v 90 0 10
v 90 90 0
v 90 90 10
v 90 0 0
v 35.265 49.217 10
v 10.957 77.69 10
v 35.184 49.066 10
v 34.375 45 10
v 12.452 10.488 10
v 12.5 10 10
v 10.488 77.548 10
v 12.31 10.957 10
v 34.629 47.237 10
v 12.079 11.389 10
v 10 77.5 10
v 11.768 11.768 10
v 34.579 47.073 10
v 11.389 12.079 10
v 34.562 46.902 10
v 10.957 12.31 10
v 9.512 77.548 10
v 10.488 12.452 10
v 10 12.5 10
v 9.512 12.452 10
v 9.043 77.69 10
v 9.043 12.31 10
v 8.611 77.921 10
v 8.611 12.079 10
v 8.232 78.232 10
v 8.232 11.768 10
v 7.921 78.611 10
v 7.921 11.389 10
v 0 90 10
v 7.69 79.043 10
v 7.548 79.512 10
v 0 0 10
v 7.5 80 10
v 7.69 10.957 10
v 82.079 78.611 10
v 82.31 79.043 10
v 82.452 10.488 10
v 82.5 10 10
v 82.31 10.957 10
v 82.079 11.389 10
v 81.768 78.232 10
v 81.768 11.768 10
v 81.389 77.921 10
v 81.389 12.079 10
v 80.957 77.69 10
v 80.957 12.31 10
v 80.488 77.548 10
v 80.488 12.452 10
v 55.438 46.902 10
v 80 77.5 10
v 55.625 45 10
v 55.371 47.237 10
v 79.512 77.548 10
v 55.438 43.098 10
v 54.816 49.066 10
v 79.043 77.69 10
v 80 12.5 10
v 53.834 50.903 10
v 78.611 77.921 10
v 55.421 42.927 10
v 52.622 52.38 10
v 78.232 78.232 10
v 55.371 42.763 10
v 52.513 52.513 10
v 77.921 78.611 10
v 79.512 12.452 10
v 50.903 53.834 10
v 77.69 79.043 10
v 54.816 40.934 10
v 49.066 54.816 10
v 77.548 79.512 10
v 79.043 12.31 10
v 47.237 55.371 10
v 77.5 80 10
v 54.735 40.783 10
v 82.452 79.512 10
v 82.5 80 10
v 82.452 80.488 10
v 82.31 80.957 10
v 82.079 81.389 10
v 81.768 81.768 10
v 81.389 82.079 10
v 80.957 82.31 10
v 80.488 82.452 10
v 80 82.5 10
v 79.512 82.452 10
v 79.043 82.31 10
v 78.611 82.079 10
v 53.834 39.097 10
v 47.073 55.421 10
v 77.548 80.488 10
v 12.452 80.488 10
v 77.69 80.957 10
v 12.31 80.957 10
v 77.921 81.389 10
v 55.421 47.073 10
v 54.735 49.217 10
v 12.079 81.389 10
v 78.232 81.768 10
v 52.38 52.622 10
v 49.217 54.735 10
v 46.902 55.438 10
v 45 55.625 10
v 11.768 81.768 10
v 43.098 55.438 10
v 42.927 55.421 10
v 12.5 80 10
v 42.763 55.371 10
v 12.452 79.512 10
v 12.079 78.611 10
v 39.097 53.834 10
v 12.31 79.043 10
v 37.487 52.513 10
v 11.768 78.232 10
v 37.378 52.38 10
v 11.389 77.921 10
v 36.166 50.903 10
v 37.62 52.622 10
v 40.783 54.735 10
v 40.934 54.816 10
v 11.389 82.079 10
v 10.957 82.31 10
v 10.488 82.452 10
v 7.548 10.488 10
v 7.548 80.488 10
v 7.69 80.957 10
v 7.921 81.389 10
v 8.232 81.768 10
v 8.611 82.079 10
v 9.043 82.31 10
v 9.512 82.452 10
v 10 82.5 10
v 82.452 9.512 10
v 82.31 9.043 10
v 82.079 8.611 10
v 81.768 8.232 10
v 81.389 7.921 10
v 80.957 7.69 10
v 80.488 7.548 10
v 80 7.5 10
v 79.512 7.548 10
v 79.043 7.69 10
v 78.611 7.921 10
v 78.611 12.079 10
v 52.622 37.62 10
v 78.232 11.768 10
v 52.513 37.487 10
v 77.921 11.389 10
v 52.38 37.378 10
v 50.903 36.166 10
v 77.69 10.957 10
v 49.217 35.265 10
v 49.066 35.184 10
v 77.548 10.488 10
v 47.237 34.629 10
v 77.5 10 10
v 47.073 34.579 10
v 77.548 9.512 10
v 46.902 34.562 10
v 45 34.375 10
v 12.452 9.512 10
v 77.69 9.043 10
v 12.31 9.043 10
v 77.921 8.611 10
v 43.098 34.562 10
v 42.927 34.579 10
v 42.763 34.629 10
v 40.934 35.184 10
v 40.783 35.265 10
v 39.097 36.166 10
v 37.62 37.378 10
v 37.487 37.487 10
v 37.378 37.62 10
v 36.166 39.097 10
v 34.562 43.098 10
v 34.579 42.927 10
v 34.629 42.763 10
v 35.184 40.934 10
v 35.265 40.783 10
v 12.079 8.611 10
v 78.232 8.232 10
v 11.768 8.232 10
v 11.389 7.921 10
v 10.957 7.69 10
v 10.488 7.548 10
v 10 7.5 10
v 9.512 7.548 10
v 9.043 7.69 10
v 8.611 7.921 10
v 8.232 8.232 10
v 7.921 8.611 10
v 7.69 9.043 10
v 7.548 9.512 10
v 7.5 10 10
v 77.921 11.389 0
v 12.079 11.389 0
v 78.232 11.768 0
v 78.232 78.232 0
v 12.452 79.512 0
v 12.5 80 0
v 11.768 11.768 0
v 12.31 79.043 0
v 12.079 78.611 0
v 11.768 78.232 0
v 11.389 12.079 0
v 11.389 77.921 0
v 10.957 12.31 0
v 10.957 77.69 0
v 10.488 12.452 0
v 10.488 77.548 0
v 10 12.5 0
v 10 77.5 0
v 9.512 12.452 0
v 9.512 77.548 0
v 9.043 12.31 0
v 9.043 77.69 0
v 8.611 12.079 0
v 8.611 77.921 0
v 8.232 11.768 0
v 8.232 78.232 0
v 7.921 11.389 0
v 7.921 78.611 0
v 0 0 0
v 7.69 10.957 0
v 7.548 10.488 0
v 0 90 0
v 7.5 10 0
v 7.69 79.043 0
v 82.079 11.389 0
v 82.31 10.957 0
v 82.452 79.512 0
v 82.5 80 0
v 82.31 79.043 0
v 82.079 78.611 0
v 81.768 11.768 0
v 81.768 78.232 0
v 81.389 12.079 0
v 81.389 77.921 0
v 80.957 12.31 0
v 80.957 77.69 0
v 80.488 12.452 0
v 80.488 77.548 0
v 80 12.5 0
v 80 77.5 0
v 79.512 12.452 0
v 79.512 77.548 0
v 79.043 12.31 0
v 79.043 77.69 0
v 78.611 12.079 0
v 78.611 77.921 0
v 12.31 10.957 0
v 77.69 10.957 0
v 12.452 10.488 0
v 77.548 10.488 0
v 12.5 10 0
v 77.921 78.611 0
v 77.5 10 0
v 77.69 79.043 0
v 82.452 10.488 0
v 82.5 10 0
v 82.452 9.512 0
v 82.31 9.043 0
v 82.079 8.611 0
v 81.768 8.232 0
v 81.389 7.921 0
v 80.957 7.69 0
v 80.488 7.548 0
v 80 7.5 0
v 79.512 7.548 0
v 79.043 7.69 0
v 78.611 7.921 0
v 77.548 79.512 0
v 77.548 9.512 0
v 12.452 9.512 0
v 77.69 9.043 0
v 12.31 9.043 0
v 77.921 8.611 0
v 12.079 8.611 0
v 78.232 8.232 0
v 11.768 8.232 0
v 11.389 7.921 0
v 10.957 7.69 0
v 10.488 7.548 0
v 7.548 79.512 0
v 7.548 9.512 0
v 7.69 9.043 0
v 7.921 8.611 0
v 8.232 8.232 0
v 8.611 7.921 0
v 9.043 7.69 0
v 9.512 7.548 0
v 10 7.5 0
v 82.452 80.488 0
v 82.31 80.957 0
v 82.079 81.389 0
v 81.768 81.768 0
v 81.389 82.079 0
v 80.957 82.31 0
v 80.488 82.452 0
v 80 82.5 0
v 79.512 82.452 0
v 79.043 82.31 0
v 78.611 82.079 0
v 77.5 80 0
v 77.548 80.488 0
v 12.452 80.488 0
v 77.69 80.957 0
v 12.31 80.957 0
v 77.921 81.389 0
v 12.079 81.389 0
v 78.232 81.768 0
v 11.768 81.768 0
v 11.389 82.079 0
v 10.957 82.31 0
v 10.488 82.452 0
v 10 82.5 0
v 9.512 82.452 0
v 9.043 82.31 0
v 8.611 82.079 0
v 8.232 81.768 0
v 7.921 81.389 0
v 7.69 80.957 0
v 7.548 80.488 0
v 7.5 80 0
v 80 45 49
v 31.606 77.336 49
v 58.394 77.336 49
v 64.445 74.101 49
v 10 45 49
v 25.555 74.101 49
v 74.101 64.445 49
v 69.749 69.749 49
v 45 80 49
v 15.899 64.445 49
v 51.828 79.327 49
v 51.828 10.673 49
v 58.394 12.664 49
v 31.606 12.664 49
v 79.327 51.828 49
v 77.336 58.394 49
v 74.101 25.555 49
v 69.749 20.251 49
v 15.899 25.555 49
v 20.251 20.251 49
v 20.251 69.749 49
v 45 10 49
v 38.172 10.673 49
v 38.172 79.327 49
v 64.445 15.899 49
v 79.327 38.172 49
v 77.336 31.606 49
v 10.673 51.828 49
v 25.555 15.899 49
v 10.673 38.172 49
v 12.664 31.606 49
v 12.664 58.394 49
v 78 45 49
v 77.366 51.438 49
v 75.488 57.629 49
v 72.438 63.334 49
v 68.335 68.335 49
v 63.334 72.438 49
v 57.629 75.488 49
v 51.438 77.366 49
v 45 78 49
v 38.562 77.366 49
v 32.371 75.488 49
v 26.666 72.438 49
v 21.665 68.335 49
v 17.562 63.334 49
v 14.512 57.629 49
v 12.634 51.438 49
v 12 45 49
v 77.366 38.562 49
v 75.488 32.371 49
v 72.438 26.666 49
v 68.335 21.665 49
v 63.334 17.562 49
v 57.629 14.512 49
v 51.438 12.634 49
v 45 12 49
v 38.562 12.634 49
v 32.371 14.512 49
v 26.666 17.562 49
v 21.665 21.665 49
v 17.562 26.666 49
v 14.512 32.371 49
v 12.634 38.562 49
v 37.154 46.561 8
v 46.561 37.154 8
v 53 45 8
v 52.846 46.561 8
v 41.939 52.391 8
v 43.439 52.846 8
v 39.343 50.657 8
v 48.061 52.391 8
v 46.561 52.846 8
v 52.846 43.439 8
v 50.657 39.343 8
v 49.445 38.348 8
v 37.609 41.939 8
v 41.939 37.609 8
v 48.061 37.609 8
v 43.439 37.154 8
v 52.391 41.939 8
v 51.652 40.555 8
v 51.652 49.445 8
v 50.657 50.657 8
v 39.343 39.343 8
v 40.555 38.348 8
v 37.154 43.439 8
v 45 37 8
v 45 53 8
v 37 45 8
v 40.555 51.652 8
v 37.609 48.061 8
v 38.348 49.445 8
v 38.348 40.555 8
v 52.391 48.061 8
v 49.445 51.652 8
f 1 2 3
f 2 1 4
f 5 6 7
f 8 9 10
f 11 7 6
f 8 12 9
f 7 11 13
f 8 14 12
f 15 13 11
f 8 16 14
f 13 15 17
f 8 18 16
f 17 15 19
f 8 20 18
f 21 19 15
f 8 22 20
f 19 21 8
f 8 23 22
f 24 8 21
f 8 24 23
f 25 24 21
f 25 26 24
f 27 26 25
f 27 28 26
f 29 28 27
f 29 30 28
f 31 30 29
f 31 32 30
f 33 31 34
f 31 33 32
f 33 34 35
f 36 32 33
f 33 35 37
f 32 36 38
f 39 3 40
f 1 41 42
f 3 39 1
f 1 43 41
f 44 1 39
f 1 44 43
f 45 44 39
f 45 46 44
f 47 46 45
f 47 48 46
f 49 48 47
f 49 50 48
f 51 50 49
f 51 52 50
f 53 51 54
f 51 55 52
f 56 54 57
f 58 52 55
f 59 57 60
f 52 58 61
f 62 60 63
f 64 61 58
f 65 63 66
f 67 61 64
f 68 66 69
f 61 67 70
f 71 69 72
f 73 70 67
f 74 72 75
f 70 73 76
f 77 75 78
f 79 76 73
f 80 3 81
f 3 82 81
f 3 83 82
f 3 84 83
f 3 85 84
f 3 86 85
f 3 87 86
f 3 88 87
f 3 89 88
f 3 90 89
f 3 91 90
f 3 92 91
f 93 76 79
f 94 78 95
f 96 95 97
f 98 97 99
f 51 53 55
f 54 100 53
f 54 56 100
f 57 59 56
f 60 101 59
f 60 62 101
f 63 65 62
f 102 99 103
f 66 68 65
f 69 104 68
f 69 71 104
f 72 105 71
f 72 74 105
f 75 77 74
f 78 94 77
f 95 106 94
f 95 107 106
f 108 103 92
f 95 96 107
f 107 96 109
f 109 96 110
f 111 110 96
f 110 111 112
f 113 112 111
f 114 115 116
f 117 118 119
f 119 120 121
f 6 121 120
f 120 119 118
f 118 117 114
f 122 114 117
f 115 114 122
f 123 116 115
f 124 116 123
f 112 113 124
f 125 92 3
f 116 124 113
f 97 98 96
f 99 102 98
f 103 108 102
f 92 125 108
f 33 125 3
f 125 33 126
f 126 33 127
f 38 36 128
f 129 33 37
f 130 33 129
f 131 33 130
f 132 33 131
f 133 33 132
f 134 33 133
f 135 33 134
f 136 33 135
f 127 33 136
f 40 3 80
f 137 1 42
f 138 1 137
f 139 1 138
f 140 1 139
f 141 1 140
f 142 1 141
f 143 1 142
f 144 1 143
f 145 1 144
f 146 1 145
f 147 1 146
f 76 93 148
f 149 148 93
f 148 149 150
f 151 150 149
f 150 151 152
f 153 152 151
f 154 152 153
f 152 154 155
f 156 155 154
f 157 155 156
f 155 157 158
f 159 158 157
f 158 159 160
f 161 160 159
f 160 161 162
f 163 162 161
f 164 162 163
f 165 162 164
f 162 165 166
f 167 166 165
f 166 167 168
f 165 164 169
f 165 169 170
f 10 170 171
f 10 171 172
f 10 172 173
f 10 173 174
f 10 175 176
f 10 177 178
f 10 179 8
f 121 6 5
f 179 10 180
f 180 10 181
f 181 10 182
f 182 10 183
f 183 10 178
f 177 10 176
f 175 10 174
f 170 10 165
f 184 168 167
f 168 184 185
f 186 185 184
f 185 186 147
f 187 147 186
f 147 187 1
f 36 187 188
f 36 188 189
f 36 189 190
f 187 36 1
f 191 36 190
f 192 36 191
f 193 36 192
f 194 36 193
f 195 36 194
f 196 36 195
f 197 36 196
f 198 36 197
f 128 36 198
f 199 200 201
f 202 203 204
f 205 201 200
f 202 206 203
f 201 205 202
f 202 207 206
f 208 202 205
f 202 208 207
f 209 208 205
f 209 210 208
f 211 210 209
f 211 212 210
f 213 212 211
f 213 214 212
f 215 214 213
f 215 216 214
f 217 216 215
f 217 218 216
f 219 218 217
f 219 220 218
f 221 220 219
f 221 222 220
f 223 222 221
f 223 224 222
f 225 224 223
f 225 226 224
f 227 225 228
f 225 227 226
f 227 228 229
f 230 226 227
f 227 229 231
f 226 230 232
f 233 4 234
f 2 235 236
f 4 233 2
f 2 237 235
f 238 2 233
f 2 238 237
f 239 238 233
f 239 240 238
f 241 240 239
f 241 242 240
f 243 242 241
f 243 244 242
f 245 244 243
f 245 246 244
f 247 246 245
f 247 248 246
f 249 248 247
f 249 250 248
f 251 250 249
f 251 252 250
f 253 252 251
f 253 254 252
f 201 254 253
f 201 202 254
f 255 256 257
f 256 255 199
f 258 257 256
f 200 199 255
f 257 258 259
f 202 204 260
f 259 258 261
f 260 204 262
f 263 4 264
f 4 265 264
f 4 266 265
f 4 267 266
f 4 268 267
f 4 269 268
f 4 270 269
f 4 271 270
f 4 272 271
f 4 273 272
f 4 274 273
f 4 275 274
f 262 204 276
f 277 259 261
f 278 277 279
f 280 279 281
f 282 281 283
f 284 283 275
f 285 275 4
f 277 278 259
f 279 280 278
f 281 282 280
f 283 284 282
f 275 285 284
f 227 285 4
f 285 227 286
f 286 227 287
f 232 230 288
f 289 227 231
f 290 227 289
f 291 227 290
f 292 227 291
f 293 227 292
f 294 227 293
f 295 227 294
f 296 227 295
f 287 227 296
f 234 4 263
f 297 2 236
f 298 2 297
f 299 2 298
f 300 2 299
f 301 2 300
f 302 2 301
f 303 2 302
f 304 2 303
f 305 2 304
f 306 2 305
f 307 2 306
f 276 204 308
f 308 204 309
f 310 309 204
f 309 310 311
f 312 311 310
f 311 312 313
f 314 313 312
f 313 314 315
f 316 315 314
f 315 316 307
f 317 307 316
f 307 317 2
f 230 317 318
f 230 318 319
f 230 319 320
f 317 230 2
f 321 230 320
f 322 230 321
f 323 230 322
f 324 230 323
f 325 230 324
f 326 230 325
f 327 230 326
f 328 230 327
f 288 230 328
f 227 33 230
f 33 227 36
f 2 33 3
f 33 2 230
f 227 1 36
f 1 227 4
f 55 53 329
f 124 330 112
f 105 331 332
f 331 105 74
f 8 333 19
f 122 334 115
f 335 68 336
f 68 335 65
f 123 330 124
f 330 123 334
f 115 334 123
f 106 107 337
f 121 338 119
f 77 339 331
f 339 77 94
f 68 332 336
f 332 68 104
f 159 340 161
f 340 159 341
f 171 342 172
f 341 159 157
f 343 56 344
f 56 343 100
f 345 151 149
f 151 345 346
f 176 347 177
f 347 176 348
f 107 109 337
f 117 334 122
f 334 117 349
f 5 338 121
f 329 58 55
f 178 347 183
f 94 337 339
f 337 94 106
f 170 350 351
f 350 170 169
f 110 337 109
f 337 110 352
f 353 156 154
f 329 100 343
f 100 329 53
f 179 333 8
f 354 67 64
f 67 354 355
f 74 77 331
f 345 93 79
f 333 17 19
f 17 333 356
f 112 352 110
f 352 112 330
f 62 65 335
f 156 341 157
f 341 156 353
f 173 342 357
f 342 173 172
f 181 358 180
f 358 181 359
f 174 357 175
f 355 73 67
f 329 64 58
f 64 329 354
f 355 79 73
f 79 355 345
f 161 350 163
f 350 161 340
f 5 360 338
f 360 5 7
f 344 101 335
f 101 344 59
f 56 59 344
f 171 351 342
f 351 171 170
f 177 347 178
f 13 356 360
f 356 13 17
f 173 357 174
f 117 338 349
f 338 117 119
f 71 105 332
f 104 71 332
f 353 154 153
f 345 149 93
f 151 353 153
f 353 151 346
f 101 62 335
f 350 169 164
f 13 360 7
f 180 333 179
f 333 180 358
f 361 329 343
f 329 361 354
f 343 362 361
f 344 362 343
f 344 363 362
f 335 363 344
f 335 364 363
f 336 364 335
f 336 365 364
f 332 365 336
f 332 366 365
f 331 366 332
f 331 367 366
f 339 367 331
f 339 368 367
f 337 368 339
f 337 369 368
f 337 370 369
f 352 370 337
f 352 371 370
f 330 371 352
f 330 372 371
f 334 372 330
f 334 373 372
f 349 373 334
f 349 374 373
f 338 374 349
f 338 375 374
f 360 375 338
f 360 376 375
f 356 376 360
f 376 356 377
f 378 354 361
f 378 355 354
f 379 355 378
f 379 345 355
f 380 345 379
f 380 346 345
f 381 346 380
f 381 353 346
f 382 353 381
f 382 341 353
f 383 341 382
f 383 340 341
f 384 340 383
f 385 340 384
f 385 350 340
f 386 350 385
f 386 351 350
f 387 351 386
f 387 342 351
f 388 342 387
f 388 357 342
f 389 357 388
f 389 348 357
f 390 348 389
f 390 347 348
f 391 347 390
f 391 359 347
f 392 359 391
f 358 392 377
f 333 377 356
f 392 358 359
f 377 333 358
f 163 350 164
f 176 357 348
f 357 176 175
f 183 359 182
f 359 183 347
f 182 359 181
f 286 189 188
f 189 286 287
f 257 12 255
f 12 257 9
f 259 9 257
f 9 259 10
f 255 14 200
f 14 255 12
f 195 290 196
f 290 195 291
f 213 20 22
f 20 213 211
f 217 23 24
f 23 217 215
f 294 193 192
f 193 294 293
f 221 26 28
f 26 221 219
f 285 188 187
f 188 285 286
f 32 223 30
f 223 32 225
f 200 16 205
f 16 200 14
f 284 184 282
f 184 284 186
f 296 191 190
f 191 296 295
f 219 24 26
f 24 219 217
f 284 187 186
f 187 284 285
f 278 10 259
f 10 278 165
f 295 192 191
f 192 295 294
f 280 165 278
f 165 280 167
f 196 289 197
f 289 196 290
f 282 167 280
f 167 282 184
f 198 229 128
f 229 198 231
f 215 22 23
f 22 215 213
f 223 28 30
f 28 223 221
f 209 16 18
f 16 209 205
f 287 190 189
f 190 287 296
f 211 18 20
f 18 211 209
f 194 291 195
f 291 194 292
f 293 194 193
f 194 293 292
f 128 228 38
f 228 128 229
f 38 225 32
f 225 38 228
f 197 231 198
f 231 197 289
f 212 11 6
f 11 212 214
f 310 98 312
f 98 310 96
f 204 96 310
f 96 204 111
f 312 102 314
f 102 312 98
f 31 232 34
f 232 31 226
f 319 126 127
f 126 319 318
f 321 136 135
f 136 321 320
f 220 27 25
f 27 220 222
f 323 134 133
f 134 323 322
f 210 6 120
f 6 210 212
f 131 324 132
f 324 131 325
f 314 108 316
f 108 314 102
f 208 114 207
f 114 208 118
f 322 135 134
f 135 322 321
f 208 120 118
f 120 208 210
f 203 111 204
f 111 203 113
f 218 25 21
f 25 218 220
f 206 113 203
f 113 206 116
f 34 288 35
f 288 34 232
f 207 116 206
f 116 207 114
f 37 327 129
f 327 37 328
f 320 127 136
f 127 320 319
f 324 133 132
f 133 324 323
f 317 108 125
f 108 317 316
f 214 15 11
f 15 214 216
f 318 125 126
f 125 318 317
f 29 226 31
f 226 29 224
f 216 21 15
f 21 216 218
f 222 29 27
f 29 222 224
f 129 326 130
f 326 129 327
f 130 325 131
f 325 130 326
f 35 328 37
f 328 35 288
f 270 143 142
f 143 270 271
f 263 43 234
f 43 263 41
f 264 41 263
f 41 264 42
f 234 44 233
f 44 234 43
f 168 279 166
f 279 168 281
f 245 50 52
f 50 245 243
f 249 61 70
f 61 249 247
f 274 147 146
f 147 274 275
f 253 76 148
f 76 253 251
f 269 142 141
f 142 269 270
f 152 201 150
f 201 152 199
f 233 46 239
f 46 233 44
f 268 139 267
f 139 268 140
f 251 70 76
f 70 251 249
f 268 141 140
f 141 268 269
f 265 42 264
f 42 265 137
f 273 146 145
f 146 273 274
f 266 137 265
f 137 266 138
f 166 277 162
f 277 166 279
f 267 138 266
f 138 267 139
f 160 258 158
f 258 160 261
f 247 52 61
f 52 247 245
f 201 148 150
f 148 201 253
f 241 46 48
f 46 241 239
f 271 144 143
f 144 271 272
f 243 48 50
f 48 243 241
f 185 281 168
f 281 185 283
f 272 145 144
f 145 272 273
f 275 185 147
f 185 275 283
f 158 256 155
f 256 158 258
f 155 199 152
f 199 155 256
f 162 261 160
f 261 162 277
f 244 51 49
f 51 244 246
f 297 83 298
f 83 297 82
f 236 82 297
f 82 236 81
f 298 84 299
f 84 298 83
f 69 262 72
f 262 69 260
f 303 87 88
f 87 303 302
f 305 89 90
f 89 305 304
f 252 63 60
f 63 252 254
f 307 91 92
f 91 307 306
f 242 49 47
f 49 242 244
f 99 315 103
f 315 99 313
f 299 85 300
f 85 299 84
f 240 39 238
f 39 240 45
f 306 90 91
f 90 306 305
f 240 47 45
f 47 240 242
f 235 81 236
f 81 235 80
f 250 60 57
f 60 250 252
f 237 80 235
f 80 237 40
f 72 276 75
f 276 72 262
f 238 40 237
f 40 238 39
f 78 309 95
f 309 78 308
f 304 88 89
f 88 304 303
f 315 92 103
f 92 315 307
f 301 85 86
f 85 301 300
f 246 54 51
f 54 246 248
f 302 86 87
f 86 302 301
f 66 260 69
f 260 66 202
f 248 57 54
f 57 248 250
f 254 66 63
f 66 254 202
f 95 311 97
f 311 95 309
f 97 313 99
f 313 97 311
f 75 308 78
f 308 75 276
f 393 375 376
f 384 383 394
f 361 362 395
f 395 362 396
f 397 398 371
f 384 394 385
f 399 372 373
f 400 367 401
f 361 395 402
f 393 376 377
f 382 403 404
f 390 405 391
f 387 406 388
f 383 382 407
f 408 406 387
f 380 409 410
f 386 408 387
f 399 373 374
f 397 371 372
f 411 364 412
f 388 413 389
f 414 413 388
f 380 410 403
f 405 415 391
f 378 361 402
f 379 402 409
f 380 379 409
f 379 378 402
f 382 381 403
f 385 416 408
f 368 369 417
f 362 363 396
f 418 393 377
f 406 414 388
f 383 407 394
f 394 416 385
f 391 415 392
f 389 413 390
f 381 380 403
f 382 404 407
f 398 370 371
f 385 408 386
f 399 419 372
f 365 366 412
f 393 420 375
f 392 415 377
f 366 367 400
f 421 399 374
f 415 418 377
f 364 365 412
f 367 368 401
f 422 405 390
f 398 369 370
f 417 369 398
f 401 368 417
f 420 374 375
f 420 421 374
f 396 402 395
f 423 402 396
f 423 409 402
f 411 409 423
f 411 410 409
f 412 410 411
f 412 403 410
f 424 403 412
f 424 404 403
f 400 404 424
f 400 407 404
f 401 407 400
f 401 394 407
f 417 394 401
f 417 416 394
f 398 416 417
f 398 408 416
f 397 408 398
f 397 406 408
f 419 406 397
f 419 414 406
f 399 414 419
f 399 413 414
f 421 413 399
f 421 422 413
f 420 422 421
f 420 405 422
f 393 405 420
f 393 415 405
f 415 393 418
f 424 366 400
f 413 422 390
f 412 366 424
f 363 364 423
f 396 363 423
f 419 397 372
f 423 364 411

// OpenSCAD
$fn = 32;

// ----------------------------------------------------------------------
// Hopper: flanged with square flange
// ----------------------------------------------------------------------

// --- parameters (mm) ---
fl = 90;                  // flange side, X and Y
fl_t = 10;                // flange thickness
cone_h = 40;              // cone height above the flange
top_d = 70;               // cone mouth diameter
bot_d = 20;               // cone spout diameter
wall = 2;                 // cone wall thickness
hole_r = 2.5;             // flange hole radius
hole_in = 10;             // hole inset from the corners

bore_d = bot_d - 2 * wall;  // spout bore diameter
total_h = fl_t + cone_h - 1;  // overall height

difference() {
  union() {
    cube([fl, fl, fl_t]);
    translate([fl / 2, fl / 2, fl_t - 1])
      cylinder(h = cone_h, d1 = bot_d, d2 = top_d);
  }
  translate([fl / 2, fl / 2, fl_t - 2])
    cylinder(h = cone_h + 1, d1 = bore_d, d2 = top_d - 2 * wall);
  for (sx = [0, 1], sy = [0, 1])
    translate([sx ? fl - hole_in : hole_in,
               sy ? fl - hole_in : hole_in, -1])
      cylinder(r = hole_r, h = fl_t + 2);
}
